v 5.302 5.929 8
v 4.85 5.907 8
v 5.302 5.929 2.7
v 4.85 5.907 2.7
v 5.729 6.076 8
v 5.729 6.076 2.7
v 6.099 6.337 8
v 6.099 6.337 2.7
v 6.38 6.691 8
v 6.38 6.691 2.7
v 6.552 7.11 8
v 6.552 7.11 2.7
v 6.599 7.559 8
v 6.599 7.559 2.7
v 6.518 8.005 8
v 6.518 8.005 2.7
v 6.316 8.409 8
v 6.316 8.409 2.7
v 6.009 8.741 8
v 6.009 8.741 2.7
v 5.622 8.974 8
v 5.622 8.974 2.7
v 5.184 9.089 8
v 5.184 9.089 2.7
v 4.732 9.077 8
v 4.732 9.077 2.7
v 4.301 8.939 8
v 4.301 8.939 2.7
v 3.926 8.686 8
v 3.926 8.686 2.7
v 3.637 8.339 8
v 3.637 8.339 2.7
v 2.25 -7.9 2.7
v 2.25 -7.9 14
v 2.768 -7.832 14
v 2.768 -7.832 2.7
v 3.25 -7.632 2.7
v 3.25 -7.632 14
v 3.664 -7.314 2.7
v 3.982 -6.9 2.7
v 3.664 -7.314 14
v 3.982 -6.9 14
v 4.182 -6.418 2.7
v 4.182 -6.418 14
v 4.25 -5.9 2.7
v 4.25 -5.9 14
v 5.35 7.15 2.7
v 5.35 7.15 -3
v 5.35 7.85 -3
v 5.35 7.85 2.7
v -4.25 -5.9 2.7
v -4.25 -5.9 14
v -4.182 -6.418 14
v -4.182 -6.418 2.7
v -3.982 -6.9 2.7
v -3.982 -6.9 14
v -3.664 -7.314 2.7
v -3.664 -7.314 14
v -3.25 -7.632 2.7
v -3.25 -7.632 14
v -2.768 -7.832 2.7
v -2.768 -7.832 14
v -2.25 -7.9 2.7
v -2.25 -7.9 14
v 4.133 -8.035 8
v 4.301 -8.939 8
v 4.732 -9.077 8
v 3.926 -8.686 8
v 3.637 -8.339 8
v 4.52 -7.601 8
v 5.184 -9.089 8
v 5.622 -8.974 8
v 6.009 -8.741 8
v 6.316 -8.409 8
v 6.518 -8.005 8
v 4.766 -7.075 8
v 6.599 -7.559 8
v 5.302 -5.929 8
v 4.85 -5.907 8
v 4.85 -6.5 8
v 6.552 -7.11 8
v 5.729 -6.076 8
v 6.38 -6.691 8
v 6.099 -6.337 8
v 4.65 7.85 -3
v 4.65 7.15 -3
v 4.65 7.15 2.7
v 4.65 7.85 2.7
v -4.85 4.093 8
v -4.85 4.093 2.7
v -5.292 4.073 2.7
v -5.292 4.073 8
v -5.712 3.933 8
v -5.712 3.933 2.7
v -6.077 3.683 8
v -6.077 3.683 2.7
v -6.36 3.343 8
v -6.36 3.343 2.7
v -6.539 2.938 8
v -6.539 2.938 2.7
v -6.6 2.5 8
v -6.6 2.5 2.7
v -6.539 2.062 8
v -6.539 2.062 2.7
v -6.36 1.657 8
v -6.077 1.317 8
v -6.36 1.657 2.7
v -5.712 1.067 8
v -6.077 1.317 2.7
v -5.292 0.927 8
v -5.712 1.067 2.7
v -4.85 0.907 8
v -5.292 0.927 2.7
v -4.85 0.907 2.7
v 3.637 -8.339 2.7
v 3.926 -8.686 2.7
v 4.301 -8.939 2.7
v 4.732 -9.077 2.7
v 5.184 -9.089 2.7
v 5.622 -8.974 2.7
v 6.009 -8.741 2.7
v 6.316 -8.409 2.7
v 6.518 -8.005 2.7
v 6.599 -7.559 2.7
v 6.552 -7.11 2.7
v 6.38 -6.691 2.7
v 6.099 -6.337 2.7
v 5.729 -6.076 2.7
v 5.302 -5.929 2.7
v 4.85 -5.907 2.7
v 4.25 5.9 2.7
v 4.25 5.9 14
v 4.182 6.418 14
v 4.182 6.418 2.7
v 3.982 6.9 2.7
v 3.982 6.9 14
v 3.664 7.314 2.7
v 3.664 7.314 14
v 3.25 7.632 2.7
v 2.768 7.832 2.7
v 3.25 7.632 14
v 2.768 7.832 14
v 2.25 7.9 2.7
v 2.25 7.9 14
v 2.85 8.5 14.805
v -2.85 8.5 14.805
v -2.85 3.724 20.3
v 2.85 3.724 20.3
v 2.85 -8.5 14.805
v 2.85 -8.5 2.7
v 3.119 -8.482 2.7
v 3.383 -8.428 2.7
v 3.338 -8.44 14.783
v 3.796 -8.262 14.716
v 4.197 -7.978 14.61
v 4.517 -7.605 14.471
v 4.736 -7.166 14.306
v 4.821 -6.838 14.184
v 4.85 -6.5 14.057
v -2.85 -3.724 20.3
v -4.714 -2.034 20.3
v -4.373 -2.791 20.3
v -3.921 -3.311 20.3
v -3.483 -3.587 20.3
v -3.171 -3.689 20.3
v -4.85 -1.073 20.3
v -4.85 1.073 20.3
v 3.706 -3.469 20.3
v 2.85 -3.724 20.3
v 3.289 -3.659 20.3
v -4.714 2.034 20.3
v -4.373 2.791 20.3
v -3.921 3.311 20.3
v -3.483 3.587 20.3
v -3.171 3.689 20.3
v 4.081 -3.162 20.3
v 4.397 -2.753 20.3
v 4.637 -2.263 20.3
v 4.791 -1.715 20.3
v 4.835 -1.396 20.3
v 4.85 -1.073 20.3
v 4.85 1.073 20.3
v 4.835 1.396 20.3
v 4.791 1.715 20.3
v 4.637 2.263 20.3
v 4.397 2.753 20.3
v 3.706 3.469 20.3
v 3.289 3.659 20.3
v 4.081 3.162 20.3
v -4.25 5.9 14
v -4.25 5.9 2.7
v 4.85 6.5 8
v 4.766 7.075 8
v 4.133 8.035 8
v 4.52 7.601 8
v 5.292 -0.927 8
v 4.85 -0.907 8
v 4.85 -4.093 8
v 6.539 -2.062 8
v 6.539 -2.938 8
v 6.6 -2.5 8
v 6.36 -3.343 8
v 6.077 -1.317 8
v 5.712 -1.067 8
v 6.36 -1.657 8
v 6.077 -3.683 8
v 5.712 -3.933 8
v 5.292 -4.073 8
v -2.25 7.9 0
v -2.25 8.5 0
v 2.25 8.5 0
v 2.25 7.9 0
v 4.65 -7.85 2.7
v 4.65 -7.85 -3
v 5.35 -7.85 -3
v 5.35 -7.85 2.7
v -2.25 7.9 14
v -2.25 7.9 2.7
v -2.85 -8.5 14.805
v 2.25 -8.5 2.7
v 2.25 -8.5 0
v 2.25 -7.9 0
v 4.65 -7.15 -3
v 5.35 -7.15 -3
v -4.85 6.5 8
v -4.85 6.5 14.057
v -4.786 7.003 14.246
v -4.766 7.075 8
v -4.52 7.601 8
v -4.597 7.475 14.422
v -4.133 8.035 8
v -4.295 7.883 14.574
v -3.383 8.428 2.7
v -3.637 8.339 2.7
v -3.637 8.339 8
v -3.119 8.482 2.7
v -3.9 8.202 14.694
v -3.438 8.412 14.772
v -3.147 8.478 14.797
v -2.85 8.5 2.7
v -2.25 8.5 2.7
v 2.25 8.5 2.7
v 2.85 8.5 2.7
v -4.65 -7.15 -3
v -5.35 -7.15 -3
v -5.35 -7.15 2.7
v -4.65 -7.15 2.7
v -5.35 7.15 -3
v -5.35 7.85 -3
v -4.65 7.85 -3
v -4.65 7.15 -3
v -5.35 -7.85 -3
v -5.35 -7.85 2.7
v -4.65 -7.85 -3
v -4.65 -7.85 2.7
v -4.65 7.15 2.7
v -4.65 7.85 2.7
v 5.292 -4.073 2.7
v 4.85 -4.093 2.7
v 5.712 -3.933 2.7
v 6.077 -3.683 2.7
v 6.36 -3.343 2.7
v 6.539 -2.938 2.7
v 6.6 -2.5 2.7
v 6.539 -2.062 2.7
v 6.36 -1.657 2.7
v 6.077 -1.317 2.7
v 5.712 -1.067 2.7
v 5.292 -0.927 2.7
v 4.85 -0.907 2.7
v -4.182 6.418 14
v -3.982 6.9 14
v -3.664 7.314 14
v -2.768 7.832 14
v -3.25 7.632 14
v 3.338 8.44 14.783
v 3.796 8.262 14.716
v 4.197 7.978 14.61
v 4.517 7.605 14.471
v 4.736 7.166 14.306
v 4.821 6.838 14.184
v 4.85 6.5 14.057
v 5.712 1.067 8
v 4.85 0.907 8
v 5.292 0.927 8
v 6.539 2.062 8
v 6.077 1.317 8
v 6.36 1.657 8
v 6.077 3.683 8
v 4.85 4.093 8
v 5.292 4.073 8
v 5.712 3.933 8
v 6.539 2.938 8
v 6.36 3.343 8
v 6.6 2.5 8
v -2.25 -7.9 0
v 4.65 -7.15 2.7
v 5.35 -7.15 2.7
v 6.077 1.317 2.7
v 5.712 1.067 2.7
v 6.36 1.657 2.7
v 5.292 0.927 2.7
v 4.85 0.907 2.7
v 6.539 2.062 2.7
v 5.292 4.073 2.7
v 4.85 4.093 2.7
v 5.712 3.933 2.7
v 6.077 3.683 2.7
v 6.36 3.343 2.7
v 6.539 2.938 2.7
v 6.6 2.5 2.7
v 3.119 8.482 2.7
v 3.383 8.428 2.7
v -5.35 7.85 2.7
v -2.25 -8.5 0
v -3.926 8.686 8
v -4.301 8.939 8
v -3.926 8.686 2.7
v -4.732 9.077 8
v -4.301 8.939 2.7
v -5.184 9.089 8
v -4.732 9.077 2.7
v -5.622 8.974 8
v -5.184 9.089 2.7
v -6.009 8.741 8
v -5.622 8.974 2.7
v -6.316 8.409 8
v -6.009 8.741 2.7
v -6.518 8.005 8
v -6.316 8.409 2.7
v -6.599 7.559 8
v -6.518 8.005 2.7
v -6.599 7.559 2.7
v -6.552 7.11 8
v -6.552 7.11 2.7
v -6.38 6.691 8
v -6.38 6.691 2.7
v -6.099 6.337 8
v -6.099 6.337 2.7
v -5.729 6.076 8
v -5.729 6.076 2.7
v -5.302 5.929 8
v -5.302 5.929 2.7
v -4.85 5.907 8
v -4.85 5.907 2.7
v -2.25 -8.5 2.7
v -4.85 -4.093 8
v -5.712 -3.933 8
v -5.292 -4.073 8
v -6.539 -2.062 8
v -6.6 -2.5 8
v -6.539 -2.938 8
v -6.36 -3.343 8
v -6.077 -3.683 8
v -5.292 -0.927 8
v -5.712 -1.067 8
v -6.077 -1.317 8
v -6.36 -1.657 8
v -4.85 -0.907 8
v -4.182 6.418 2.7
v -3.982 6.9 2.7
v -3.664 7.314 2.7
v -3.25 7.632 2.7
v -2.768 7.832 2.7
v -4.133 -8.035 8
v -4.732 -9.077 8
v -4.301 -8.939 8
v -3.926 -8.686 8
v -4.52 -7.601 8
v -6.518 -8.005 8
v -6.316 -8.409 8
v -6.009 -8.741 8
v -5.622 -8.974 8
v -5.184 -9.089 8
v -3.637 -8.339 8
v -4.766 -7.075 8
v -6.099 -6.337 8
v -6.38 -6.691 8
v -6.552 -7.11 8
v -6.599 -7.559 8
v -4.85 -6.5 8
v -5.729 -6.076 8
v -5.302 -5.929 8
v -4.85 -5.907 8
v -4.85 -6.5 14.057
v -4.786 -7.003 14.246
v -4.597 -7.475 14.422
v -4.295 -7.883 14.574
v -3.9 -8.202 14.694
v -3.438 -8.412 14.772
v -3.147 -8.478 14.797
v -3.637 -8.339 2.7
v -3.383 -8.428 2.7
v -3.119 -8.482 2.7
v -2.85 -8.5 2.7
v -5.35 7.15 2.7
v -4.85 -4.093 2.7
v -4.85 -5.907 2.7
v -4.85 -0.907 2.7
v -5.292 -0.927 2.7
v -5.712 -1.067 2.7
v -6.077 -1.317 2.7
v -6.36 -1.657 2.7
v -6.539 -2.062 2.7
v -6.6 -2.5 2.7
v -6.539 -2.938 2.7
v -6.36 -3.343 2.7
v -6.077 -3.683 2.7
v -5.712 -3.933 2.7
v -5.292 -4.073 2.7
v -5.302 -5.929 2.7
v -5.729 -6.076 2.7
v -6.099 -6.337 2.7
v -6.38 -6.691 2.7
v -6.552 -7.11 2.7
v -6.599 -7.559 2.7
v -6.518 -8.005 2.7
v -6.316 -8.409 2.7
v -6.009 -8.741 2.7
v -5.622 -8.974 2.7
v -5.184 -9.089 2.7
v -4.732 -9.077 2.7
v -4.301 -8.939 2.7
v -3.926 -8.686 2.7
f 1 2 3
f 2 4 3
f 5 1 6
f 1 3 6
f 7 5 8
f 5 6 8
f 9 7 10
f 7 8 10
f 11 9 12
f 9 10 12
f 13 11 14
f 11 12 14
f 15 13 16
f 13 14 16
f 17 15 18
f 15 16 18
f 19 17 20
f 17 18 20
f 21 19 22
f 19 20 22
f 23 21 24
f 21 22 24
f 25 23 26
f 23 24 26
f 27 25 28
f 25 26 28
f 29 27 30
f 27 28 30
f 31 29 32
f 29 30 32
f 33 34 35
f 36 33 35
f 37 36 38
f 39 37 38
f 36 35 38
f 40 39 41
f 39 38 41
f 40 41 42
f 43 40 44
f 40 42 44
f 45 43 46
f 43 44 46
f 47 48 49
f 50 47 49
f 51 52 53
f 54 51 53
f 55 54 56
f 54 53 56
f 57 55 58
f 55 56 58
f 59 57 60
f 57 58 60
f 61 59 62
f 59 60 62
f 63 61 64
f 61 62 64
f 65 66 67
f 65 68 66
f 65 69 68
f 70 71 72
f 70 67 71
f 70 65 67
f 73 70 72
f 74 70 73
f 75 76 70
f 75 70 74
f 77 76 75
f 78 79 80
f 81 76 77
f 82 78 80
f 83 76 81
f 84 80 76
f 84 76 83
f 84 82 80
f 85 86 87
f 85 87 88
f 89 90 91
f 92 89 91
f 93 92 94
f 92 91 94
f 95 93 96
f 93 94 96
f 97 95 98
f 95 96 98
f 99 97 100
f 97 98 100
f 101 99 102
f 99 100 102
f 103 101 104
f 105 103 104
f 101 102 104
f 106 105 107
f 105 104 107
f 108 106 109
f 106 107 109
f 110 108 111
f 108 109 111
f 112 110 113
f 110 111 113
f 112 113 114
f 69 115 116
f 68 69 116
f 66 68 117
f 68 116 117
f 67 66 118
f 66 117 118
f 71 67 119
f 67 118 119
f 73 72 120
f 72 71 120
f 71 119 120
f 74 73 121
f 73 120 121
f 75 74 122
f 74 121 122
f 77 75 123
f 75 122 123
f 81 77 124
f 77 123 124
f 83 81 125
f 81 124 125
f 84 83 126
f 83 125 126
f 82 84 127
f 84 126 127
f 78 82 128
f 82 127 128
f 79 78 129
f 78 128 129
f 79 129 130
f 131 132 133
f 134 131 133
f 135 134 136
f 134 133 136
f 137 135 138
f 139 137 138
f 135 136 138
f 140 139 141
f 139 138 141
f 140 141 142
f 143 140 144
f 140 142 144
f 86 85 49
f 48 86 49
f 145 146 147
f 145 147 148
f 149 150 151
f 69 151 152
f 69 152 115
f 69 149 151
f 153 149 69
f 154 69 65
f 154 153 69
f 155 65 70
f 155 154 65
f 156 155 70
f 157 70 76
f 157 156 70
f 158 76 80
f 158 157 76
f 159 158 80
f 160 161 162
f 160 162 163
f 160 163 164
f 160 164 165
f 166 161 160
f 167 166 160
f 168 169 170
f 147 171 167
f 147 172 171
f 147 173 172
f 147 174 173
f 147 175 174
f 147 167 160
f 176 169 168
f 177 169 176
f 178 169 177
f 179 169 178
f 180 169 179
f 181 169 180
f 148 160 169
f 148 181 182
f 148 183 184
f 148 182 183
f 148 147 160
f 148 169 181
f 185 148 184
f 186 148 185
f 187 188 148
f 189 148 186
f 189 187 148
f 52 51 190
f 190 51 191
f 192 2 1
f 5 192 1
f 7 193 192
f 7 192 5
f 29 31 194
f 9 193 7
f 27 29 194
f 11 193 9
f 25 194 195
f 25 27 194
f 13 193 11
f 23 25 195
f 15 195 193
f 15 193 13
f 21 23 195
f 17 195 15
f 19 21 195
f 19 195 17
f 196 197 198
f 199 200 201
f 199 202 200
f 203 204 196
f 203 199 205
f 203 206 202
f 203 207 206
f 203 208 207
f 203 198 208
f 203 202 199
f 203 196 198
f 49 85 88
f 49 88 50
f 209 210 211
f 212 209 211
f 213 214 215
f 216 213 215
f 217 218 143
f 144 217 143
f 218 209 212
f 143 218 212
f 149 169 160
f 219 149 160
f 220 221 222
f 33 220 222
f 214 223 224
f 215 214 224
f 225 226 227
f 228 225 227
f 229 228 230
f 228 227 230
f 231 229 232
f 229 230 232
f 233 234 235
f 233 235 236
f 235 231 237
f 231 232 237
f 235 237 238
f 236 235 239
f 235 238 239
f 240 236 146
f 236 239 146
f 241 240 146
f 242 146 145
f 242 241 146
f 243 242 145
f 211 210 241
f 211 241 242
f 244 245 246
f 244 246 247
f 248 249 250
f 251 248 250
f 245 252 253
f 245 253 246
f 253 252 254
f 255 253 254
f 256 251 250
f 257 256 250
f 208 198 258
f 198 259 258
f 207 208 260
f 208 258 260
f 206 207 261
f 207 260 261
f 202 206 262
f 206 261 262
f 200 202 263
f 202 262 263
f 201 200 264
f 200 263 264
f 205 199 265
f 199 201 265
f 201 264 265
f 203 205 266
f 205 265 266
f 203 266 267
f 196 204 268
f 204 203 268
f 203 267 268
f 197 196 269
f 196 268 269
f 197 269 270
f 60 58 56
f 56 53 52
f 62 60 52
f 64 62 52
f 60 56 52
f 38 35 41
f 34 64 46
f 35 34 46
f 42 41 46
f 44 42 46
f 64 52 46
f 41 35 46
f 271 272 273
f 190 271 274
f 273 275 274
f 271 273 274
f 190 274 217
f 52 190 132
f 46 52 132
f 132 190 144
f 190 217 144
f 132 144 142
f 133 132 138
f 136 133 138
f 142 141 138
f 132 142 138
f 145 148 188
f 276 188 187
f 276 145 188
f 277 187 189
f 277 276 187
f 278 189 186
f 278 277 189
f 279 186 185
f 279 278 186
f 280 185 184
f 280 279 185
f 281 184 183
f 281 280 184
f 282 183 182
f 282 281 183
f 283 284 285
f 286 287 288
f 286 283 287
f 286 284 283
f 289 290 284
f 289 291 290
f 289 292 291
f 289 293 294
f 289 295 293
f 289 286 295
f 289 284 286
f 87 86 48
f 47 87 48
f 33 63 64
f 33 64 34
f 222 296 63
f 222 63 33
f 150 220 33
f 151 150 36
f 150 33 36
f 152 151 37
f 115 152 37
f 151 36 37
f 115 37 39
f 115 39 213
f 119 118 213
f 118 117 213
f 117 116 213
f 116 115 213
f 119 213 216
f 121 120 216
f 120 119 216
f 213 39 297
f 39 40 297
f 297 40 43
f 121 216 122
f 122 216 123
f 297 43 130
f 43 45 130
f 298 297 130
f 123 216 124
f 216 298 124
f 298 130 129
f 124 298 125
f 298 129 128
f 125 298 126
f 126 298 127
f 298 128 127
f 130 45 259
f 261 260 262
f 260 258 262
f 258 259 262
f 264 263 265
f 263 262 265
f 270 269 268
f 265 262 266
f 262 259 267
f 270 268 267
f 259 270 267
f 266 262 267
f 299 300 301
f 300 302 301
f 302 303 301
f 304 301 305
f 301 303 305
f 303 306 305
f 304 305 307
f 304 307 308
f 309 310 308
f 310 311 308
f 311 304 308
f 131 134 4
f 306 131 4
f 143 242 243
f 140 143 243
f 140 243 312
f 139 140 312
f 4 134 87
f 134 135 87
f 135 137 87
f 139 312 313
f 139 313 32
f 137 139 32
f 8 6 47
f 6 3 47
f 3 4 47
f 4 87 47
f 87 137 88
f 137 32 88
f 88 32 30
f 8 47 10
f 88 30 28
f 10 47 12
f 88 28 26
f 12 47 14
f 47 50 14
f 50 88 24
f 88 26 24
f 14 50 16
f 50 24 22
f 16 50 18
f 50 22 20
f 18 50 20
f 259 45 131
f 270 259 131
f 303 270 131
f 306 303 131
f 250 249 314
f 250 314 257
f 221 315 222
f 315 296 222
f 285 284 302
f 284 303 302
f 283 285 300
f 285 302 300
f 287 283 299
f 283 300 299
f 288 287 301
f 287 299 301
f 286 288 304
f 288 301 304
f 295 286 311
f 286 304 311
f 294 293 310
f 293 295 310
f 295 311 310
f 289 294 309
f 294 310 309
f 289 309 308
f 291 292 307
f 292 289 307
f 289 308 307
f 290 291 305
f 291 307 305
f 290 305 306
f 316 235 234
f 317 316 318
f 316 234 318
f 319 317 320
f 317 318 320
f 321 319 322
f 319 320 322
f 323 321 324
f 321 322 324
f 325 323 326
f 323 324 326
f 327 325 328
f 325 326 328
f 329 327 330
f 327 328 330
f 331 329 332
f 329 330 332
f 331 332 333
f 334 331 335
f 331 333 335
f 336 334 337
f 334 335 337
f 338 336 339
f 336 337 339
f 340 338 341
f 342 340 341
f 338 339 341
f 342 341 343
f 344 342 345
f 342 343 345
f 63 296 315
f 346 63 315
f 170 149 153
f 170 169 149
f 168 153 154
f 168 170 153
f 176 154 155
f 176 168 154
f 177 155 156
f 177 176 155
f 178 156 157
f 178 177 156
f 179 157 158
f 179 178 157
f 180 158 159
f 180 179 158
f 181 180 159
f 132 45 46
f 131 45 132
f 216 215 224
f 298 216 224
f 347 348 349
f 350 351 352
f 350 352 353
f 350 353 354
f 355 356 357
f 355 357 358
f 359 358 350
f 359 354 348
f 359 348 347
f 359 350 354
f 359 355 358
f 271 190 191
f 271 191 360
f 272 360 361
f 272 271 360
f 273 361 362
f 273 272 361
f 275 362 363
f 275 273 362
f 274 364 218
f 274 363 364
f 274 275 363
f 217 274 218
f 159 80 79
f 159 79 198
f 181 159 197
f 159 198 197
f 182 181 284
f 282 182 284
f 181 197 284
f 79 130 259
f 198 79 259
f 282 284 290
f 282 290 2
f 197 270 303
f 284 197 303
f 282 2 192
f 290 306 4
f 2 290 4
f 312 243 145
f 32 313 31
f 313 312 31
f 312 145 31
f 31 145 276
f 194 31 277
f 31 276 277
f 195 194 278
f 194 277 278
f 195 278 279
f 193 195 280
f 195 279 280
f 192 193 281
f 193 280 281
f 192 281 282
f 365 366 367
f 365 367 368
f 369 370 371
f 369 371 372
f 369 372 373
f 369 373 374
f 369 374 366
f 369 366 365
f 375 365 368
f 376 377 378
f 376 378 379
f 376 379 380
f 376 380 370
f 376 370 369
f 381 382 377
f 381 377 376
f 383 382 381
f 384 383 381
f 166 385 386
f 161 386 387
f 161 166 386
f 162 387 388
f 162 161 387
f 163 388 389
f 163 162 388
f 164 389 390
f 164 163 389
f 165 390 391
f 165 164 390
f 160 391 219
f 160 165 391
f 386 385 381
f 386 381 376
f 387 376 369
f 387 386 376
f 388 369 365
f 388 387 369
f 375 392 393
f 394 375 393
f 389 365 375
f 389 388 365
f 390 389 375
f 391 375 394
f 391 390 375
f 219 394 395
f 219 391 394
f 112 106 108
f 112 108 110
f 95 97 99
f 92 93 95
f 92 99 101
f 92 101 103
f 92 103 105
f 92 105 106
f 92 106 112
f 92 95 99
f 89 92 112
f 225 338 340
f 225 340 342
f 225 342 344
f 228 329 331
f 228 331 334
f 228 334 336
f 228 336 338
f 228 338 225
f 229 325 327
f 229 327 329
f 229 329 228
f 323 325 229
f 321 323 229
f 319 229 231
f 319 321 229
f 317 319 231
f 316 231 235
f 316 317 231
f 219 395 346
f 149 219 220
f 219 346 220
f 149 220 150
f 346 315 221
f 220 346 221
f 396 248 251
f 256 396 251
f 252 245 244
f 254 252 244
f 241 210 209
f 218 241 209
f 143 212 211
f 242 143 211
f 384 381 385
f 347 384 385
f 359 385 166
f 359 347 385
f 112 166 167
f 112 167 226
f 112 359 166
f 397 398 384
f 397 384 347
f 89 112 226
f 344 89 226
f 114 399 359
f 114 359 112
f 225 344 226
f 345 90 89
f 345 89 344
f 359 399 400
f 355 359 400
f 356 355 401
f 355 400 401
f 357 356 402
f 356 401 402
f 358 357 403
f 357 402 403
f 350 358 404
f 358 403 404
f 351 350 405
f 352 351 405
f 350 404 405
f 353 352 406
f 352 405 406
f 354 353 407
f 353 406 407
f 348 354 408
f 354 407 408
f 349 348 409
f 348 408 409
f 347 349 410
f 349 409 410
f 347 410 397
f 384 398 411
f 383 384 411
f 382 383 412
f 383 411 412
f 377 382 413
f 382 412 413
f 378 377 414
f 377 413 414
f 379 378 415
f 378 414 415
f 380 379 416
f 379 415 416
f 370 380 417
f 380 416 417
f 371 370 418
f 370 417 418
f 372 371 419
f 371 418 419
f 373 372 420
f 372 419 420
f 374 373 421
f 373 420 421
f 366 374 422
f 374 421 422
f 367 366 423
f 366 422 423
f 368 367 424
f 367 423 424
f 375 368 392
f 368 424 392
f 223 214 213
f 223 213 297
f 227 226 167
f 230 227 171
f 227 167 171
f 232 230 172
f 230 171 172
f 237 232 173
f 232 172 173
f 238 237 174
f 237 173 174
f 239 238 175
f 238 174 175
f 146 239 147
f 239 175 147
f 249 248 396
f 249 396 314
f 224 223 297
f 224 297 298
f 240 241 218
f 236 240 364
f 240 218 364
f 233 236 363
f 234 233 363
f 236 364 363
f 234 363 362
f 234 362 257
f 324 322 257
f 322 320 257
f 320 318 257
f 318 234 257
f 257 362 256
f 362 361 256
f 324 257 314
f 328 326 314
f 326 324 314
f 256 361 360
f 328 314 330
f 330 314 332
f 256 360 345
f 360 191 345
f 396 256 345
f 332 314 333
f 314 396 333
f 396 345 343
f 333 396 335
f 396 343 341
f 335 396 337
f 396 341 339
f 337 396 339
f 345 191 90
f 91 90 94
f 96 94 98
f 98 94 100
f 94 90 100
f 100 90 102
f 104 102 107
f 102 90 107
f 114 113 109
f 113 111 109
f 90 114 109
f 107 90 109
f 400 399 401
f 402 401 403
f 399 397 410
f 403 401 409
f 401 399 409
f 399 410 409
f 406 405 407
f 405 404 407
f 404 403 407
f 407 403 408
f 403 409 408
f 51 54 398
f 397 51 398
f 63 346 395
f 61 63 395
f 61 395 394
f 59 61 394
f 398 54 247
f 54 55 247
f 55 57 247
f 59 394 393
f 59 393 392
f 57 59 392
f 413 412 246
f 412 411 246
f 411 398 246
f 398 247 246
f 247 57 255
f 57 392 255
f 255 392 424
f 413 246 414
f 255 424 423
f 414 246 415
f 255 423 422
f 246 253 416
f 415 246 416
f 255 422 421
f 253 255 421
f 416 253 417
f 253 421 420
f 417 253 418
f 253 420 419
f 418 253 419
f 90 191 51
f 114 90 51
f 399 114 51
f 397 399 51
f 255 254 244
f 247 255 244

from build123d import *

# Parameters (mm, degrees)
BOX005_W               = 0.7
BOX005_H               = 0.7
BOX005_DEPTH           = 6
BOX006_W               = 0.7
BOX006_H               = 0.7
BOX006_DEPTH           = 6
BOX007_W               = 0.7
BOX007_H               = 0.7
BOX007_DEPTH           = 6
BOX004_W               = 0.7
BOX004_H               = 0.7
BOX004_DEPTH           = 6
BOX009_W               = 10
BOX009_H               = 26
BOX009_DEPTH           = 2.7
BOX010_W               = 8.5
BOX010_H               = 15.8
BOX010_DEPTH           = 14
FILLET001_R            = 2
BOX008_W               = 10
BOX008_H               = 26
BOX008_DEPTH           = 2.7
CYLINDER001_R          = 1.6
CYLINDER001_DEPTH      = 8
CYLINDER002_R          = 1.6
CYLINDER002_DEPTH      = 8
CYLINDER003_R          = 1.6
CYLINDER003_DEPTH      = 8
CYLINDER004_R          = 1.6
CYLINDER004_DEPTH      = 8
CYLINDER005_R          = 1.6
CYLINDER005_DEPTH      = 8
CYLINDER006_R          = 1.6
CYLINDER006_DEPTH      = 8
CYLINDER007_R          = 1.6
CYLINDER007_DEPTH      = 8
CYLINDER_R             = 1.6
CYLINDER_DEPTH         = 8
BOX003_W               = 10
BOX003_H               = 10
BOX003_DEPTH           = 10
BOX003_ROLL_ANGLE      = 40.999967
BOX003_PLACEMENT_ANGLE = 180
BOX002_W               = 10
BOX002_H               = 10
BOX002_DEPTH           = 10
BOX002_ROLL_ANGLE      = 40.999967
BOX001_W               = 9.7
BOX001_H               = 17
BOX001_DEPTH           = 20.299999
FILLET_R               = 2


with BuildPart() as pin001:
    # Box005 → Box005 (new body)
    with BuildSketch(Plane(origin=(-5.35, 7.15, -3), x_dir=(1, 0, 0), z_dir=(0, 0, 1))):
        with Locations((0.35, 0.35)):
            Rectangle(BOX005_W, BOX005_H)
    extrude(amount=BOX005_DEPTH)


with BuildPart() as pin002:
    # Box006 → Box006 (new body)
    with BuildSketch(Plane(origin=(-5.35, -7.85, -3), x_dir=(1, 0, 0), z_dir=(0, 0, 1))):
        with Locations((0.35, 0.35)):
            Rectangle(BOX006_W, BOX006_H)
    extrude(amount=BOX006_DEPTH)


with BuildPart() as pin003:
    # Box007 → Box007 (new body)
    with BuildSketch(Plane(origin=(4.65, -7.85, -3), x_dir=(1, 0, 0), z_dir=(0, 0, 1))):
        with Locations((0.35, 0.35)):
            Rectangle(BOX007_W, BOX007_H)
    extrude(amount=BOX007_DEPTH)


with BuildPart() as pins:
    # Box004 → Box004 (new body)
    with BuildSketch(Plane(origin=(4.65, 7.15, -3), x_dir=(1, 0, 0), z_dir=(0, 0, 1))):
        with Locations((0.35, 0.35)):
            Rectangle(BOX004_W, BOX004_H)
    extrude(amount=BOX004_DEPTH)

    # Fusion003: union Pin001, Pin002, Pin003
    add(pin001.part)
    add(pin002.part)
    add(pin003.part)


with BuildPart() as box009:
    # Box009 → Box009 (new body)
    with BuildSketch(Plane(origin=(-2.25, 13, 0), x_dir=(-1, 0, 0), z_dir=(0, 0, 1))):
        with Locations((5, 13)):
            Rectangle(BOX009_W, BOX009_H)
    extrude(amount=BOX009_DEPTH)


with BuildPart() as fillet001:
    # Box010 → Box010 (new body)
    with BuildSketch(Plane(origin=(-4.25, -7.9, 0), x_dir=(1, 0, 0), z_dir=(0, 0, 1))):
        with Locations((4.25, 7.9)):
            Rectangle(BOX010_W, BOX010_H)
    extrude(amount=BOX010_DEPTH)

    # Fillet001
    fillet001_edges = [fillet001.edges().sort_by_distance(p)[0] for p in [
        (-4.25, -7.9, 7),
        (-4.25, 7.9, 7),
        (4.25, -7.9, 7),
        (4.25, 7.9, 7),
    ]]
    fillet(fillet001_edges, radius=FILLET001_R)


with BuildPart() as fusion004:
    # Box008 → Box008 (new body)
    with BuildSketch(Plane(origin=(2.25, -13, 0), x_dir=(1, 0, 0), z_dir=(0, 0, 1))):
        with Locations((5, 13)):
            Rectangle(BOX008_W, BOX008_H)
    extrude(amount=BOX008_DEPTH)

    # Fusion004: union Box009, Fillet001
    add(box009.part)
    add(fillet001.part)


with BuildPart() as cylinder001:
    # Cylinder001 → Cylinder001 (new body)
    with BuildSketch(Plane(origin=(-5, 2.5, 0), x_dir=(1, 0, 0), z_dir=(0, 0, 1))):
        Circle(CYLINDER001_R)
    extrude(amount=CYLINDER001_DEPTH)


with BuildPart() as cylinder002:
    # Cylinder002 → Cylinder002 (new body)
    with BuildSketch(Plane(origin=(-5, -2.5, 0), x_dir=(1, 0, 0), z_dir=(0, 0, 1))):
        Circle(CYLINDER002_R)
    extrude(amount=CYLINDER002_DEPTH)


with BuildPart() as cylinder003:
    # Cylinder003 → Cylinder003 (new body)
    with BuildSketch(Plane(origin=(-5, -7.5, 0), x_dir=(1, 0, 0), z_dir=(0, 0, 1))):
        Circle(CYLINDER003_R)
    extrude(amount=CYLINDER003_DEPTH)


with BuildPart() as cylinder004:
    # Cylinder004 → Cylinder004 (new body)
    with BuildSketch(Plane(origin=(5, 7.5, 0), x_dir=(1, 0, 0), z_dir=(0, 0, 1))):
        Circle(CYLINDER004_R)
    extrude(amount=CYLINDER004_DEPTH)


with BuildPart() as cylinder005:
    # Cylinder005 → Cylinder005 (new body)
    with BuildSketch(Plane(origin=(5, 2.5, 0), x_dir=(1, 0, 0), z_dir=(0, 0, 1))):
        Circle(CYLINDER005_R)
    extrude(amount=CYLINDER005_DEPTH)


with BuildPart() as cylinder006:
    # Cylinder006 → Cylinder006 (new body)
    with BuildSketch(Plane(origin=(5, -2.5, 0), x_dir=(1, 0, 0), z_dir=(0, 0, 1))):
        Circle(CYLINDER006_R)
    extrude(amount=CYLINDER006_DEPTH)


with BuildPart() as cylinder007:
    # Cylinder007 → Cylinder007 (new body)
    with BuildSketch(Plane(origin=(5, -7.5, 0), x_dir=(1, 0, 0), z_dir=(0, 0, 1))):
        Circle(CYLINDER007_R)
    extrude(amount=CYLINDER007_DEPTH)


with BuildPart() as pinholder:
    # Cylinder → Cylinder (new body)
    with BuildSketch(Plane(origin=(-5, 7.5, 0), x_dir=(1, 0, 0), z_dir=(0, 0, 1))):
        Circle(CYLINDER_R)
    extrude(amount=CYLINDER_DEPTH)

    # Fusion001: union Cylinder001, Cylinder002, Cylinder003, Cylinder004, Cylinder005, Cylinder006, Cylinder007
    add(cylinder001.part)
    add(cylinder002.part)
    add(cylinder003.part)
    add(cylinder004.part)
    add(cylinder005.part)
    add(cylinder006.part)
    add(cylinder007.part)


with BuildPart() as box003:
    # Box003 → Box003 (new body)
    with BuildSketch(Plane.XY):
        with Locations((5, 5)):
            Rectangle(BOX003_W, BOX003_H)
    extrude(amount=BOX003_DEPTH)


with BuildPart() as box003_1:
    # Box003 roll: moved
    add(box003.part.rotate(Axis((0, 0, 0), (1, 0, 0)), BOX003_ROLL_ANGLE))


with BuildPart() as box003_2:
    # Box003 placement: moved
    add(box003_1.part.moved(Location((10, -0.7, 14))).rotate(Axis((10, -0.7, 14), (0, 0, 1)), BOX003_PLACEMENT_ANGLE))


with BuildPart() as fusion:
    # Box002 → Box002 (new body)
    with BuildSketch(Plane.XY):
        with Locations((5, 5)):
            Rectangle(BOX002_W, BOX002_H)
    extrude(amount=BOX002_DEPTH)


with BuildPart() as fusion_1:
    # Box002 roll: moved
    add(fusion.part.rotate(Axis((0, 0, 0), (1, 0, 0)), BOX002_ROLL_ANGLE))


with BuildPart() as fusion_2:
    # Box002 placement: moved
    add(fusion_1.part.moved(Location((0, 17.7, 14))))

    # Fusion: union Box003
    add(box003_2.part)


with BuildPart() as b82721k:
    # Box001 → Box001 (new body)
    with BuildSketch(Plane.XY):
        with Locations((4.85, 8.5)):
            Rectangle(BOX001_W, BOX001_H)
    extrude(amount=BOX001_DEPTH)

    # Cut: cut Fusion
    add(fusion_2.part, mode=Mode.SUBTRACT)

    # Fillet
    fillet_edges = [b82721k.edges().sort_by_distance(p)[0] for p in [
        (0, 0, 7.402629),
        (0, 2.38825, 17.552629),
        (0, 14.61175, 17.552629),
        (0, 17, 7.402629),
        (9.7, 17, 7.402629),
        (9.7, 0, 7.402629),
        (9.7, 2.38825, 17.552629),
        (9.7, 14.61175, 17.552629),
    ]]
    fillet(fillet_edges, radius=FILLET_R)


with BuildPart() as b82721k_1:
    # Fillet placement: moved
    add(b82721k.part.moved(Location((-4.85, -8.5, 0))))

    # Fusion002: union pinholder
    add(pinholder.part)

    # Cut001: cut Fusion004
    add(fusion004.part, mode=Mode.SUBTRACT)

    # Fusion005: union Pins
    add(pins.part)


solid = b82721k_1.part
